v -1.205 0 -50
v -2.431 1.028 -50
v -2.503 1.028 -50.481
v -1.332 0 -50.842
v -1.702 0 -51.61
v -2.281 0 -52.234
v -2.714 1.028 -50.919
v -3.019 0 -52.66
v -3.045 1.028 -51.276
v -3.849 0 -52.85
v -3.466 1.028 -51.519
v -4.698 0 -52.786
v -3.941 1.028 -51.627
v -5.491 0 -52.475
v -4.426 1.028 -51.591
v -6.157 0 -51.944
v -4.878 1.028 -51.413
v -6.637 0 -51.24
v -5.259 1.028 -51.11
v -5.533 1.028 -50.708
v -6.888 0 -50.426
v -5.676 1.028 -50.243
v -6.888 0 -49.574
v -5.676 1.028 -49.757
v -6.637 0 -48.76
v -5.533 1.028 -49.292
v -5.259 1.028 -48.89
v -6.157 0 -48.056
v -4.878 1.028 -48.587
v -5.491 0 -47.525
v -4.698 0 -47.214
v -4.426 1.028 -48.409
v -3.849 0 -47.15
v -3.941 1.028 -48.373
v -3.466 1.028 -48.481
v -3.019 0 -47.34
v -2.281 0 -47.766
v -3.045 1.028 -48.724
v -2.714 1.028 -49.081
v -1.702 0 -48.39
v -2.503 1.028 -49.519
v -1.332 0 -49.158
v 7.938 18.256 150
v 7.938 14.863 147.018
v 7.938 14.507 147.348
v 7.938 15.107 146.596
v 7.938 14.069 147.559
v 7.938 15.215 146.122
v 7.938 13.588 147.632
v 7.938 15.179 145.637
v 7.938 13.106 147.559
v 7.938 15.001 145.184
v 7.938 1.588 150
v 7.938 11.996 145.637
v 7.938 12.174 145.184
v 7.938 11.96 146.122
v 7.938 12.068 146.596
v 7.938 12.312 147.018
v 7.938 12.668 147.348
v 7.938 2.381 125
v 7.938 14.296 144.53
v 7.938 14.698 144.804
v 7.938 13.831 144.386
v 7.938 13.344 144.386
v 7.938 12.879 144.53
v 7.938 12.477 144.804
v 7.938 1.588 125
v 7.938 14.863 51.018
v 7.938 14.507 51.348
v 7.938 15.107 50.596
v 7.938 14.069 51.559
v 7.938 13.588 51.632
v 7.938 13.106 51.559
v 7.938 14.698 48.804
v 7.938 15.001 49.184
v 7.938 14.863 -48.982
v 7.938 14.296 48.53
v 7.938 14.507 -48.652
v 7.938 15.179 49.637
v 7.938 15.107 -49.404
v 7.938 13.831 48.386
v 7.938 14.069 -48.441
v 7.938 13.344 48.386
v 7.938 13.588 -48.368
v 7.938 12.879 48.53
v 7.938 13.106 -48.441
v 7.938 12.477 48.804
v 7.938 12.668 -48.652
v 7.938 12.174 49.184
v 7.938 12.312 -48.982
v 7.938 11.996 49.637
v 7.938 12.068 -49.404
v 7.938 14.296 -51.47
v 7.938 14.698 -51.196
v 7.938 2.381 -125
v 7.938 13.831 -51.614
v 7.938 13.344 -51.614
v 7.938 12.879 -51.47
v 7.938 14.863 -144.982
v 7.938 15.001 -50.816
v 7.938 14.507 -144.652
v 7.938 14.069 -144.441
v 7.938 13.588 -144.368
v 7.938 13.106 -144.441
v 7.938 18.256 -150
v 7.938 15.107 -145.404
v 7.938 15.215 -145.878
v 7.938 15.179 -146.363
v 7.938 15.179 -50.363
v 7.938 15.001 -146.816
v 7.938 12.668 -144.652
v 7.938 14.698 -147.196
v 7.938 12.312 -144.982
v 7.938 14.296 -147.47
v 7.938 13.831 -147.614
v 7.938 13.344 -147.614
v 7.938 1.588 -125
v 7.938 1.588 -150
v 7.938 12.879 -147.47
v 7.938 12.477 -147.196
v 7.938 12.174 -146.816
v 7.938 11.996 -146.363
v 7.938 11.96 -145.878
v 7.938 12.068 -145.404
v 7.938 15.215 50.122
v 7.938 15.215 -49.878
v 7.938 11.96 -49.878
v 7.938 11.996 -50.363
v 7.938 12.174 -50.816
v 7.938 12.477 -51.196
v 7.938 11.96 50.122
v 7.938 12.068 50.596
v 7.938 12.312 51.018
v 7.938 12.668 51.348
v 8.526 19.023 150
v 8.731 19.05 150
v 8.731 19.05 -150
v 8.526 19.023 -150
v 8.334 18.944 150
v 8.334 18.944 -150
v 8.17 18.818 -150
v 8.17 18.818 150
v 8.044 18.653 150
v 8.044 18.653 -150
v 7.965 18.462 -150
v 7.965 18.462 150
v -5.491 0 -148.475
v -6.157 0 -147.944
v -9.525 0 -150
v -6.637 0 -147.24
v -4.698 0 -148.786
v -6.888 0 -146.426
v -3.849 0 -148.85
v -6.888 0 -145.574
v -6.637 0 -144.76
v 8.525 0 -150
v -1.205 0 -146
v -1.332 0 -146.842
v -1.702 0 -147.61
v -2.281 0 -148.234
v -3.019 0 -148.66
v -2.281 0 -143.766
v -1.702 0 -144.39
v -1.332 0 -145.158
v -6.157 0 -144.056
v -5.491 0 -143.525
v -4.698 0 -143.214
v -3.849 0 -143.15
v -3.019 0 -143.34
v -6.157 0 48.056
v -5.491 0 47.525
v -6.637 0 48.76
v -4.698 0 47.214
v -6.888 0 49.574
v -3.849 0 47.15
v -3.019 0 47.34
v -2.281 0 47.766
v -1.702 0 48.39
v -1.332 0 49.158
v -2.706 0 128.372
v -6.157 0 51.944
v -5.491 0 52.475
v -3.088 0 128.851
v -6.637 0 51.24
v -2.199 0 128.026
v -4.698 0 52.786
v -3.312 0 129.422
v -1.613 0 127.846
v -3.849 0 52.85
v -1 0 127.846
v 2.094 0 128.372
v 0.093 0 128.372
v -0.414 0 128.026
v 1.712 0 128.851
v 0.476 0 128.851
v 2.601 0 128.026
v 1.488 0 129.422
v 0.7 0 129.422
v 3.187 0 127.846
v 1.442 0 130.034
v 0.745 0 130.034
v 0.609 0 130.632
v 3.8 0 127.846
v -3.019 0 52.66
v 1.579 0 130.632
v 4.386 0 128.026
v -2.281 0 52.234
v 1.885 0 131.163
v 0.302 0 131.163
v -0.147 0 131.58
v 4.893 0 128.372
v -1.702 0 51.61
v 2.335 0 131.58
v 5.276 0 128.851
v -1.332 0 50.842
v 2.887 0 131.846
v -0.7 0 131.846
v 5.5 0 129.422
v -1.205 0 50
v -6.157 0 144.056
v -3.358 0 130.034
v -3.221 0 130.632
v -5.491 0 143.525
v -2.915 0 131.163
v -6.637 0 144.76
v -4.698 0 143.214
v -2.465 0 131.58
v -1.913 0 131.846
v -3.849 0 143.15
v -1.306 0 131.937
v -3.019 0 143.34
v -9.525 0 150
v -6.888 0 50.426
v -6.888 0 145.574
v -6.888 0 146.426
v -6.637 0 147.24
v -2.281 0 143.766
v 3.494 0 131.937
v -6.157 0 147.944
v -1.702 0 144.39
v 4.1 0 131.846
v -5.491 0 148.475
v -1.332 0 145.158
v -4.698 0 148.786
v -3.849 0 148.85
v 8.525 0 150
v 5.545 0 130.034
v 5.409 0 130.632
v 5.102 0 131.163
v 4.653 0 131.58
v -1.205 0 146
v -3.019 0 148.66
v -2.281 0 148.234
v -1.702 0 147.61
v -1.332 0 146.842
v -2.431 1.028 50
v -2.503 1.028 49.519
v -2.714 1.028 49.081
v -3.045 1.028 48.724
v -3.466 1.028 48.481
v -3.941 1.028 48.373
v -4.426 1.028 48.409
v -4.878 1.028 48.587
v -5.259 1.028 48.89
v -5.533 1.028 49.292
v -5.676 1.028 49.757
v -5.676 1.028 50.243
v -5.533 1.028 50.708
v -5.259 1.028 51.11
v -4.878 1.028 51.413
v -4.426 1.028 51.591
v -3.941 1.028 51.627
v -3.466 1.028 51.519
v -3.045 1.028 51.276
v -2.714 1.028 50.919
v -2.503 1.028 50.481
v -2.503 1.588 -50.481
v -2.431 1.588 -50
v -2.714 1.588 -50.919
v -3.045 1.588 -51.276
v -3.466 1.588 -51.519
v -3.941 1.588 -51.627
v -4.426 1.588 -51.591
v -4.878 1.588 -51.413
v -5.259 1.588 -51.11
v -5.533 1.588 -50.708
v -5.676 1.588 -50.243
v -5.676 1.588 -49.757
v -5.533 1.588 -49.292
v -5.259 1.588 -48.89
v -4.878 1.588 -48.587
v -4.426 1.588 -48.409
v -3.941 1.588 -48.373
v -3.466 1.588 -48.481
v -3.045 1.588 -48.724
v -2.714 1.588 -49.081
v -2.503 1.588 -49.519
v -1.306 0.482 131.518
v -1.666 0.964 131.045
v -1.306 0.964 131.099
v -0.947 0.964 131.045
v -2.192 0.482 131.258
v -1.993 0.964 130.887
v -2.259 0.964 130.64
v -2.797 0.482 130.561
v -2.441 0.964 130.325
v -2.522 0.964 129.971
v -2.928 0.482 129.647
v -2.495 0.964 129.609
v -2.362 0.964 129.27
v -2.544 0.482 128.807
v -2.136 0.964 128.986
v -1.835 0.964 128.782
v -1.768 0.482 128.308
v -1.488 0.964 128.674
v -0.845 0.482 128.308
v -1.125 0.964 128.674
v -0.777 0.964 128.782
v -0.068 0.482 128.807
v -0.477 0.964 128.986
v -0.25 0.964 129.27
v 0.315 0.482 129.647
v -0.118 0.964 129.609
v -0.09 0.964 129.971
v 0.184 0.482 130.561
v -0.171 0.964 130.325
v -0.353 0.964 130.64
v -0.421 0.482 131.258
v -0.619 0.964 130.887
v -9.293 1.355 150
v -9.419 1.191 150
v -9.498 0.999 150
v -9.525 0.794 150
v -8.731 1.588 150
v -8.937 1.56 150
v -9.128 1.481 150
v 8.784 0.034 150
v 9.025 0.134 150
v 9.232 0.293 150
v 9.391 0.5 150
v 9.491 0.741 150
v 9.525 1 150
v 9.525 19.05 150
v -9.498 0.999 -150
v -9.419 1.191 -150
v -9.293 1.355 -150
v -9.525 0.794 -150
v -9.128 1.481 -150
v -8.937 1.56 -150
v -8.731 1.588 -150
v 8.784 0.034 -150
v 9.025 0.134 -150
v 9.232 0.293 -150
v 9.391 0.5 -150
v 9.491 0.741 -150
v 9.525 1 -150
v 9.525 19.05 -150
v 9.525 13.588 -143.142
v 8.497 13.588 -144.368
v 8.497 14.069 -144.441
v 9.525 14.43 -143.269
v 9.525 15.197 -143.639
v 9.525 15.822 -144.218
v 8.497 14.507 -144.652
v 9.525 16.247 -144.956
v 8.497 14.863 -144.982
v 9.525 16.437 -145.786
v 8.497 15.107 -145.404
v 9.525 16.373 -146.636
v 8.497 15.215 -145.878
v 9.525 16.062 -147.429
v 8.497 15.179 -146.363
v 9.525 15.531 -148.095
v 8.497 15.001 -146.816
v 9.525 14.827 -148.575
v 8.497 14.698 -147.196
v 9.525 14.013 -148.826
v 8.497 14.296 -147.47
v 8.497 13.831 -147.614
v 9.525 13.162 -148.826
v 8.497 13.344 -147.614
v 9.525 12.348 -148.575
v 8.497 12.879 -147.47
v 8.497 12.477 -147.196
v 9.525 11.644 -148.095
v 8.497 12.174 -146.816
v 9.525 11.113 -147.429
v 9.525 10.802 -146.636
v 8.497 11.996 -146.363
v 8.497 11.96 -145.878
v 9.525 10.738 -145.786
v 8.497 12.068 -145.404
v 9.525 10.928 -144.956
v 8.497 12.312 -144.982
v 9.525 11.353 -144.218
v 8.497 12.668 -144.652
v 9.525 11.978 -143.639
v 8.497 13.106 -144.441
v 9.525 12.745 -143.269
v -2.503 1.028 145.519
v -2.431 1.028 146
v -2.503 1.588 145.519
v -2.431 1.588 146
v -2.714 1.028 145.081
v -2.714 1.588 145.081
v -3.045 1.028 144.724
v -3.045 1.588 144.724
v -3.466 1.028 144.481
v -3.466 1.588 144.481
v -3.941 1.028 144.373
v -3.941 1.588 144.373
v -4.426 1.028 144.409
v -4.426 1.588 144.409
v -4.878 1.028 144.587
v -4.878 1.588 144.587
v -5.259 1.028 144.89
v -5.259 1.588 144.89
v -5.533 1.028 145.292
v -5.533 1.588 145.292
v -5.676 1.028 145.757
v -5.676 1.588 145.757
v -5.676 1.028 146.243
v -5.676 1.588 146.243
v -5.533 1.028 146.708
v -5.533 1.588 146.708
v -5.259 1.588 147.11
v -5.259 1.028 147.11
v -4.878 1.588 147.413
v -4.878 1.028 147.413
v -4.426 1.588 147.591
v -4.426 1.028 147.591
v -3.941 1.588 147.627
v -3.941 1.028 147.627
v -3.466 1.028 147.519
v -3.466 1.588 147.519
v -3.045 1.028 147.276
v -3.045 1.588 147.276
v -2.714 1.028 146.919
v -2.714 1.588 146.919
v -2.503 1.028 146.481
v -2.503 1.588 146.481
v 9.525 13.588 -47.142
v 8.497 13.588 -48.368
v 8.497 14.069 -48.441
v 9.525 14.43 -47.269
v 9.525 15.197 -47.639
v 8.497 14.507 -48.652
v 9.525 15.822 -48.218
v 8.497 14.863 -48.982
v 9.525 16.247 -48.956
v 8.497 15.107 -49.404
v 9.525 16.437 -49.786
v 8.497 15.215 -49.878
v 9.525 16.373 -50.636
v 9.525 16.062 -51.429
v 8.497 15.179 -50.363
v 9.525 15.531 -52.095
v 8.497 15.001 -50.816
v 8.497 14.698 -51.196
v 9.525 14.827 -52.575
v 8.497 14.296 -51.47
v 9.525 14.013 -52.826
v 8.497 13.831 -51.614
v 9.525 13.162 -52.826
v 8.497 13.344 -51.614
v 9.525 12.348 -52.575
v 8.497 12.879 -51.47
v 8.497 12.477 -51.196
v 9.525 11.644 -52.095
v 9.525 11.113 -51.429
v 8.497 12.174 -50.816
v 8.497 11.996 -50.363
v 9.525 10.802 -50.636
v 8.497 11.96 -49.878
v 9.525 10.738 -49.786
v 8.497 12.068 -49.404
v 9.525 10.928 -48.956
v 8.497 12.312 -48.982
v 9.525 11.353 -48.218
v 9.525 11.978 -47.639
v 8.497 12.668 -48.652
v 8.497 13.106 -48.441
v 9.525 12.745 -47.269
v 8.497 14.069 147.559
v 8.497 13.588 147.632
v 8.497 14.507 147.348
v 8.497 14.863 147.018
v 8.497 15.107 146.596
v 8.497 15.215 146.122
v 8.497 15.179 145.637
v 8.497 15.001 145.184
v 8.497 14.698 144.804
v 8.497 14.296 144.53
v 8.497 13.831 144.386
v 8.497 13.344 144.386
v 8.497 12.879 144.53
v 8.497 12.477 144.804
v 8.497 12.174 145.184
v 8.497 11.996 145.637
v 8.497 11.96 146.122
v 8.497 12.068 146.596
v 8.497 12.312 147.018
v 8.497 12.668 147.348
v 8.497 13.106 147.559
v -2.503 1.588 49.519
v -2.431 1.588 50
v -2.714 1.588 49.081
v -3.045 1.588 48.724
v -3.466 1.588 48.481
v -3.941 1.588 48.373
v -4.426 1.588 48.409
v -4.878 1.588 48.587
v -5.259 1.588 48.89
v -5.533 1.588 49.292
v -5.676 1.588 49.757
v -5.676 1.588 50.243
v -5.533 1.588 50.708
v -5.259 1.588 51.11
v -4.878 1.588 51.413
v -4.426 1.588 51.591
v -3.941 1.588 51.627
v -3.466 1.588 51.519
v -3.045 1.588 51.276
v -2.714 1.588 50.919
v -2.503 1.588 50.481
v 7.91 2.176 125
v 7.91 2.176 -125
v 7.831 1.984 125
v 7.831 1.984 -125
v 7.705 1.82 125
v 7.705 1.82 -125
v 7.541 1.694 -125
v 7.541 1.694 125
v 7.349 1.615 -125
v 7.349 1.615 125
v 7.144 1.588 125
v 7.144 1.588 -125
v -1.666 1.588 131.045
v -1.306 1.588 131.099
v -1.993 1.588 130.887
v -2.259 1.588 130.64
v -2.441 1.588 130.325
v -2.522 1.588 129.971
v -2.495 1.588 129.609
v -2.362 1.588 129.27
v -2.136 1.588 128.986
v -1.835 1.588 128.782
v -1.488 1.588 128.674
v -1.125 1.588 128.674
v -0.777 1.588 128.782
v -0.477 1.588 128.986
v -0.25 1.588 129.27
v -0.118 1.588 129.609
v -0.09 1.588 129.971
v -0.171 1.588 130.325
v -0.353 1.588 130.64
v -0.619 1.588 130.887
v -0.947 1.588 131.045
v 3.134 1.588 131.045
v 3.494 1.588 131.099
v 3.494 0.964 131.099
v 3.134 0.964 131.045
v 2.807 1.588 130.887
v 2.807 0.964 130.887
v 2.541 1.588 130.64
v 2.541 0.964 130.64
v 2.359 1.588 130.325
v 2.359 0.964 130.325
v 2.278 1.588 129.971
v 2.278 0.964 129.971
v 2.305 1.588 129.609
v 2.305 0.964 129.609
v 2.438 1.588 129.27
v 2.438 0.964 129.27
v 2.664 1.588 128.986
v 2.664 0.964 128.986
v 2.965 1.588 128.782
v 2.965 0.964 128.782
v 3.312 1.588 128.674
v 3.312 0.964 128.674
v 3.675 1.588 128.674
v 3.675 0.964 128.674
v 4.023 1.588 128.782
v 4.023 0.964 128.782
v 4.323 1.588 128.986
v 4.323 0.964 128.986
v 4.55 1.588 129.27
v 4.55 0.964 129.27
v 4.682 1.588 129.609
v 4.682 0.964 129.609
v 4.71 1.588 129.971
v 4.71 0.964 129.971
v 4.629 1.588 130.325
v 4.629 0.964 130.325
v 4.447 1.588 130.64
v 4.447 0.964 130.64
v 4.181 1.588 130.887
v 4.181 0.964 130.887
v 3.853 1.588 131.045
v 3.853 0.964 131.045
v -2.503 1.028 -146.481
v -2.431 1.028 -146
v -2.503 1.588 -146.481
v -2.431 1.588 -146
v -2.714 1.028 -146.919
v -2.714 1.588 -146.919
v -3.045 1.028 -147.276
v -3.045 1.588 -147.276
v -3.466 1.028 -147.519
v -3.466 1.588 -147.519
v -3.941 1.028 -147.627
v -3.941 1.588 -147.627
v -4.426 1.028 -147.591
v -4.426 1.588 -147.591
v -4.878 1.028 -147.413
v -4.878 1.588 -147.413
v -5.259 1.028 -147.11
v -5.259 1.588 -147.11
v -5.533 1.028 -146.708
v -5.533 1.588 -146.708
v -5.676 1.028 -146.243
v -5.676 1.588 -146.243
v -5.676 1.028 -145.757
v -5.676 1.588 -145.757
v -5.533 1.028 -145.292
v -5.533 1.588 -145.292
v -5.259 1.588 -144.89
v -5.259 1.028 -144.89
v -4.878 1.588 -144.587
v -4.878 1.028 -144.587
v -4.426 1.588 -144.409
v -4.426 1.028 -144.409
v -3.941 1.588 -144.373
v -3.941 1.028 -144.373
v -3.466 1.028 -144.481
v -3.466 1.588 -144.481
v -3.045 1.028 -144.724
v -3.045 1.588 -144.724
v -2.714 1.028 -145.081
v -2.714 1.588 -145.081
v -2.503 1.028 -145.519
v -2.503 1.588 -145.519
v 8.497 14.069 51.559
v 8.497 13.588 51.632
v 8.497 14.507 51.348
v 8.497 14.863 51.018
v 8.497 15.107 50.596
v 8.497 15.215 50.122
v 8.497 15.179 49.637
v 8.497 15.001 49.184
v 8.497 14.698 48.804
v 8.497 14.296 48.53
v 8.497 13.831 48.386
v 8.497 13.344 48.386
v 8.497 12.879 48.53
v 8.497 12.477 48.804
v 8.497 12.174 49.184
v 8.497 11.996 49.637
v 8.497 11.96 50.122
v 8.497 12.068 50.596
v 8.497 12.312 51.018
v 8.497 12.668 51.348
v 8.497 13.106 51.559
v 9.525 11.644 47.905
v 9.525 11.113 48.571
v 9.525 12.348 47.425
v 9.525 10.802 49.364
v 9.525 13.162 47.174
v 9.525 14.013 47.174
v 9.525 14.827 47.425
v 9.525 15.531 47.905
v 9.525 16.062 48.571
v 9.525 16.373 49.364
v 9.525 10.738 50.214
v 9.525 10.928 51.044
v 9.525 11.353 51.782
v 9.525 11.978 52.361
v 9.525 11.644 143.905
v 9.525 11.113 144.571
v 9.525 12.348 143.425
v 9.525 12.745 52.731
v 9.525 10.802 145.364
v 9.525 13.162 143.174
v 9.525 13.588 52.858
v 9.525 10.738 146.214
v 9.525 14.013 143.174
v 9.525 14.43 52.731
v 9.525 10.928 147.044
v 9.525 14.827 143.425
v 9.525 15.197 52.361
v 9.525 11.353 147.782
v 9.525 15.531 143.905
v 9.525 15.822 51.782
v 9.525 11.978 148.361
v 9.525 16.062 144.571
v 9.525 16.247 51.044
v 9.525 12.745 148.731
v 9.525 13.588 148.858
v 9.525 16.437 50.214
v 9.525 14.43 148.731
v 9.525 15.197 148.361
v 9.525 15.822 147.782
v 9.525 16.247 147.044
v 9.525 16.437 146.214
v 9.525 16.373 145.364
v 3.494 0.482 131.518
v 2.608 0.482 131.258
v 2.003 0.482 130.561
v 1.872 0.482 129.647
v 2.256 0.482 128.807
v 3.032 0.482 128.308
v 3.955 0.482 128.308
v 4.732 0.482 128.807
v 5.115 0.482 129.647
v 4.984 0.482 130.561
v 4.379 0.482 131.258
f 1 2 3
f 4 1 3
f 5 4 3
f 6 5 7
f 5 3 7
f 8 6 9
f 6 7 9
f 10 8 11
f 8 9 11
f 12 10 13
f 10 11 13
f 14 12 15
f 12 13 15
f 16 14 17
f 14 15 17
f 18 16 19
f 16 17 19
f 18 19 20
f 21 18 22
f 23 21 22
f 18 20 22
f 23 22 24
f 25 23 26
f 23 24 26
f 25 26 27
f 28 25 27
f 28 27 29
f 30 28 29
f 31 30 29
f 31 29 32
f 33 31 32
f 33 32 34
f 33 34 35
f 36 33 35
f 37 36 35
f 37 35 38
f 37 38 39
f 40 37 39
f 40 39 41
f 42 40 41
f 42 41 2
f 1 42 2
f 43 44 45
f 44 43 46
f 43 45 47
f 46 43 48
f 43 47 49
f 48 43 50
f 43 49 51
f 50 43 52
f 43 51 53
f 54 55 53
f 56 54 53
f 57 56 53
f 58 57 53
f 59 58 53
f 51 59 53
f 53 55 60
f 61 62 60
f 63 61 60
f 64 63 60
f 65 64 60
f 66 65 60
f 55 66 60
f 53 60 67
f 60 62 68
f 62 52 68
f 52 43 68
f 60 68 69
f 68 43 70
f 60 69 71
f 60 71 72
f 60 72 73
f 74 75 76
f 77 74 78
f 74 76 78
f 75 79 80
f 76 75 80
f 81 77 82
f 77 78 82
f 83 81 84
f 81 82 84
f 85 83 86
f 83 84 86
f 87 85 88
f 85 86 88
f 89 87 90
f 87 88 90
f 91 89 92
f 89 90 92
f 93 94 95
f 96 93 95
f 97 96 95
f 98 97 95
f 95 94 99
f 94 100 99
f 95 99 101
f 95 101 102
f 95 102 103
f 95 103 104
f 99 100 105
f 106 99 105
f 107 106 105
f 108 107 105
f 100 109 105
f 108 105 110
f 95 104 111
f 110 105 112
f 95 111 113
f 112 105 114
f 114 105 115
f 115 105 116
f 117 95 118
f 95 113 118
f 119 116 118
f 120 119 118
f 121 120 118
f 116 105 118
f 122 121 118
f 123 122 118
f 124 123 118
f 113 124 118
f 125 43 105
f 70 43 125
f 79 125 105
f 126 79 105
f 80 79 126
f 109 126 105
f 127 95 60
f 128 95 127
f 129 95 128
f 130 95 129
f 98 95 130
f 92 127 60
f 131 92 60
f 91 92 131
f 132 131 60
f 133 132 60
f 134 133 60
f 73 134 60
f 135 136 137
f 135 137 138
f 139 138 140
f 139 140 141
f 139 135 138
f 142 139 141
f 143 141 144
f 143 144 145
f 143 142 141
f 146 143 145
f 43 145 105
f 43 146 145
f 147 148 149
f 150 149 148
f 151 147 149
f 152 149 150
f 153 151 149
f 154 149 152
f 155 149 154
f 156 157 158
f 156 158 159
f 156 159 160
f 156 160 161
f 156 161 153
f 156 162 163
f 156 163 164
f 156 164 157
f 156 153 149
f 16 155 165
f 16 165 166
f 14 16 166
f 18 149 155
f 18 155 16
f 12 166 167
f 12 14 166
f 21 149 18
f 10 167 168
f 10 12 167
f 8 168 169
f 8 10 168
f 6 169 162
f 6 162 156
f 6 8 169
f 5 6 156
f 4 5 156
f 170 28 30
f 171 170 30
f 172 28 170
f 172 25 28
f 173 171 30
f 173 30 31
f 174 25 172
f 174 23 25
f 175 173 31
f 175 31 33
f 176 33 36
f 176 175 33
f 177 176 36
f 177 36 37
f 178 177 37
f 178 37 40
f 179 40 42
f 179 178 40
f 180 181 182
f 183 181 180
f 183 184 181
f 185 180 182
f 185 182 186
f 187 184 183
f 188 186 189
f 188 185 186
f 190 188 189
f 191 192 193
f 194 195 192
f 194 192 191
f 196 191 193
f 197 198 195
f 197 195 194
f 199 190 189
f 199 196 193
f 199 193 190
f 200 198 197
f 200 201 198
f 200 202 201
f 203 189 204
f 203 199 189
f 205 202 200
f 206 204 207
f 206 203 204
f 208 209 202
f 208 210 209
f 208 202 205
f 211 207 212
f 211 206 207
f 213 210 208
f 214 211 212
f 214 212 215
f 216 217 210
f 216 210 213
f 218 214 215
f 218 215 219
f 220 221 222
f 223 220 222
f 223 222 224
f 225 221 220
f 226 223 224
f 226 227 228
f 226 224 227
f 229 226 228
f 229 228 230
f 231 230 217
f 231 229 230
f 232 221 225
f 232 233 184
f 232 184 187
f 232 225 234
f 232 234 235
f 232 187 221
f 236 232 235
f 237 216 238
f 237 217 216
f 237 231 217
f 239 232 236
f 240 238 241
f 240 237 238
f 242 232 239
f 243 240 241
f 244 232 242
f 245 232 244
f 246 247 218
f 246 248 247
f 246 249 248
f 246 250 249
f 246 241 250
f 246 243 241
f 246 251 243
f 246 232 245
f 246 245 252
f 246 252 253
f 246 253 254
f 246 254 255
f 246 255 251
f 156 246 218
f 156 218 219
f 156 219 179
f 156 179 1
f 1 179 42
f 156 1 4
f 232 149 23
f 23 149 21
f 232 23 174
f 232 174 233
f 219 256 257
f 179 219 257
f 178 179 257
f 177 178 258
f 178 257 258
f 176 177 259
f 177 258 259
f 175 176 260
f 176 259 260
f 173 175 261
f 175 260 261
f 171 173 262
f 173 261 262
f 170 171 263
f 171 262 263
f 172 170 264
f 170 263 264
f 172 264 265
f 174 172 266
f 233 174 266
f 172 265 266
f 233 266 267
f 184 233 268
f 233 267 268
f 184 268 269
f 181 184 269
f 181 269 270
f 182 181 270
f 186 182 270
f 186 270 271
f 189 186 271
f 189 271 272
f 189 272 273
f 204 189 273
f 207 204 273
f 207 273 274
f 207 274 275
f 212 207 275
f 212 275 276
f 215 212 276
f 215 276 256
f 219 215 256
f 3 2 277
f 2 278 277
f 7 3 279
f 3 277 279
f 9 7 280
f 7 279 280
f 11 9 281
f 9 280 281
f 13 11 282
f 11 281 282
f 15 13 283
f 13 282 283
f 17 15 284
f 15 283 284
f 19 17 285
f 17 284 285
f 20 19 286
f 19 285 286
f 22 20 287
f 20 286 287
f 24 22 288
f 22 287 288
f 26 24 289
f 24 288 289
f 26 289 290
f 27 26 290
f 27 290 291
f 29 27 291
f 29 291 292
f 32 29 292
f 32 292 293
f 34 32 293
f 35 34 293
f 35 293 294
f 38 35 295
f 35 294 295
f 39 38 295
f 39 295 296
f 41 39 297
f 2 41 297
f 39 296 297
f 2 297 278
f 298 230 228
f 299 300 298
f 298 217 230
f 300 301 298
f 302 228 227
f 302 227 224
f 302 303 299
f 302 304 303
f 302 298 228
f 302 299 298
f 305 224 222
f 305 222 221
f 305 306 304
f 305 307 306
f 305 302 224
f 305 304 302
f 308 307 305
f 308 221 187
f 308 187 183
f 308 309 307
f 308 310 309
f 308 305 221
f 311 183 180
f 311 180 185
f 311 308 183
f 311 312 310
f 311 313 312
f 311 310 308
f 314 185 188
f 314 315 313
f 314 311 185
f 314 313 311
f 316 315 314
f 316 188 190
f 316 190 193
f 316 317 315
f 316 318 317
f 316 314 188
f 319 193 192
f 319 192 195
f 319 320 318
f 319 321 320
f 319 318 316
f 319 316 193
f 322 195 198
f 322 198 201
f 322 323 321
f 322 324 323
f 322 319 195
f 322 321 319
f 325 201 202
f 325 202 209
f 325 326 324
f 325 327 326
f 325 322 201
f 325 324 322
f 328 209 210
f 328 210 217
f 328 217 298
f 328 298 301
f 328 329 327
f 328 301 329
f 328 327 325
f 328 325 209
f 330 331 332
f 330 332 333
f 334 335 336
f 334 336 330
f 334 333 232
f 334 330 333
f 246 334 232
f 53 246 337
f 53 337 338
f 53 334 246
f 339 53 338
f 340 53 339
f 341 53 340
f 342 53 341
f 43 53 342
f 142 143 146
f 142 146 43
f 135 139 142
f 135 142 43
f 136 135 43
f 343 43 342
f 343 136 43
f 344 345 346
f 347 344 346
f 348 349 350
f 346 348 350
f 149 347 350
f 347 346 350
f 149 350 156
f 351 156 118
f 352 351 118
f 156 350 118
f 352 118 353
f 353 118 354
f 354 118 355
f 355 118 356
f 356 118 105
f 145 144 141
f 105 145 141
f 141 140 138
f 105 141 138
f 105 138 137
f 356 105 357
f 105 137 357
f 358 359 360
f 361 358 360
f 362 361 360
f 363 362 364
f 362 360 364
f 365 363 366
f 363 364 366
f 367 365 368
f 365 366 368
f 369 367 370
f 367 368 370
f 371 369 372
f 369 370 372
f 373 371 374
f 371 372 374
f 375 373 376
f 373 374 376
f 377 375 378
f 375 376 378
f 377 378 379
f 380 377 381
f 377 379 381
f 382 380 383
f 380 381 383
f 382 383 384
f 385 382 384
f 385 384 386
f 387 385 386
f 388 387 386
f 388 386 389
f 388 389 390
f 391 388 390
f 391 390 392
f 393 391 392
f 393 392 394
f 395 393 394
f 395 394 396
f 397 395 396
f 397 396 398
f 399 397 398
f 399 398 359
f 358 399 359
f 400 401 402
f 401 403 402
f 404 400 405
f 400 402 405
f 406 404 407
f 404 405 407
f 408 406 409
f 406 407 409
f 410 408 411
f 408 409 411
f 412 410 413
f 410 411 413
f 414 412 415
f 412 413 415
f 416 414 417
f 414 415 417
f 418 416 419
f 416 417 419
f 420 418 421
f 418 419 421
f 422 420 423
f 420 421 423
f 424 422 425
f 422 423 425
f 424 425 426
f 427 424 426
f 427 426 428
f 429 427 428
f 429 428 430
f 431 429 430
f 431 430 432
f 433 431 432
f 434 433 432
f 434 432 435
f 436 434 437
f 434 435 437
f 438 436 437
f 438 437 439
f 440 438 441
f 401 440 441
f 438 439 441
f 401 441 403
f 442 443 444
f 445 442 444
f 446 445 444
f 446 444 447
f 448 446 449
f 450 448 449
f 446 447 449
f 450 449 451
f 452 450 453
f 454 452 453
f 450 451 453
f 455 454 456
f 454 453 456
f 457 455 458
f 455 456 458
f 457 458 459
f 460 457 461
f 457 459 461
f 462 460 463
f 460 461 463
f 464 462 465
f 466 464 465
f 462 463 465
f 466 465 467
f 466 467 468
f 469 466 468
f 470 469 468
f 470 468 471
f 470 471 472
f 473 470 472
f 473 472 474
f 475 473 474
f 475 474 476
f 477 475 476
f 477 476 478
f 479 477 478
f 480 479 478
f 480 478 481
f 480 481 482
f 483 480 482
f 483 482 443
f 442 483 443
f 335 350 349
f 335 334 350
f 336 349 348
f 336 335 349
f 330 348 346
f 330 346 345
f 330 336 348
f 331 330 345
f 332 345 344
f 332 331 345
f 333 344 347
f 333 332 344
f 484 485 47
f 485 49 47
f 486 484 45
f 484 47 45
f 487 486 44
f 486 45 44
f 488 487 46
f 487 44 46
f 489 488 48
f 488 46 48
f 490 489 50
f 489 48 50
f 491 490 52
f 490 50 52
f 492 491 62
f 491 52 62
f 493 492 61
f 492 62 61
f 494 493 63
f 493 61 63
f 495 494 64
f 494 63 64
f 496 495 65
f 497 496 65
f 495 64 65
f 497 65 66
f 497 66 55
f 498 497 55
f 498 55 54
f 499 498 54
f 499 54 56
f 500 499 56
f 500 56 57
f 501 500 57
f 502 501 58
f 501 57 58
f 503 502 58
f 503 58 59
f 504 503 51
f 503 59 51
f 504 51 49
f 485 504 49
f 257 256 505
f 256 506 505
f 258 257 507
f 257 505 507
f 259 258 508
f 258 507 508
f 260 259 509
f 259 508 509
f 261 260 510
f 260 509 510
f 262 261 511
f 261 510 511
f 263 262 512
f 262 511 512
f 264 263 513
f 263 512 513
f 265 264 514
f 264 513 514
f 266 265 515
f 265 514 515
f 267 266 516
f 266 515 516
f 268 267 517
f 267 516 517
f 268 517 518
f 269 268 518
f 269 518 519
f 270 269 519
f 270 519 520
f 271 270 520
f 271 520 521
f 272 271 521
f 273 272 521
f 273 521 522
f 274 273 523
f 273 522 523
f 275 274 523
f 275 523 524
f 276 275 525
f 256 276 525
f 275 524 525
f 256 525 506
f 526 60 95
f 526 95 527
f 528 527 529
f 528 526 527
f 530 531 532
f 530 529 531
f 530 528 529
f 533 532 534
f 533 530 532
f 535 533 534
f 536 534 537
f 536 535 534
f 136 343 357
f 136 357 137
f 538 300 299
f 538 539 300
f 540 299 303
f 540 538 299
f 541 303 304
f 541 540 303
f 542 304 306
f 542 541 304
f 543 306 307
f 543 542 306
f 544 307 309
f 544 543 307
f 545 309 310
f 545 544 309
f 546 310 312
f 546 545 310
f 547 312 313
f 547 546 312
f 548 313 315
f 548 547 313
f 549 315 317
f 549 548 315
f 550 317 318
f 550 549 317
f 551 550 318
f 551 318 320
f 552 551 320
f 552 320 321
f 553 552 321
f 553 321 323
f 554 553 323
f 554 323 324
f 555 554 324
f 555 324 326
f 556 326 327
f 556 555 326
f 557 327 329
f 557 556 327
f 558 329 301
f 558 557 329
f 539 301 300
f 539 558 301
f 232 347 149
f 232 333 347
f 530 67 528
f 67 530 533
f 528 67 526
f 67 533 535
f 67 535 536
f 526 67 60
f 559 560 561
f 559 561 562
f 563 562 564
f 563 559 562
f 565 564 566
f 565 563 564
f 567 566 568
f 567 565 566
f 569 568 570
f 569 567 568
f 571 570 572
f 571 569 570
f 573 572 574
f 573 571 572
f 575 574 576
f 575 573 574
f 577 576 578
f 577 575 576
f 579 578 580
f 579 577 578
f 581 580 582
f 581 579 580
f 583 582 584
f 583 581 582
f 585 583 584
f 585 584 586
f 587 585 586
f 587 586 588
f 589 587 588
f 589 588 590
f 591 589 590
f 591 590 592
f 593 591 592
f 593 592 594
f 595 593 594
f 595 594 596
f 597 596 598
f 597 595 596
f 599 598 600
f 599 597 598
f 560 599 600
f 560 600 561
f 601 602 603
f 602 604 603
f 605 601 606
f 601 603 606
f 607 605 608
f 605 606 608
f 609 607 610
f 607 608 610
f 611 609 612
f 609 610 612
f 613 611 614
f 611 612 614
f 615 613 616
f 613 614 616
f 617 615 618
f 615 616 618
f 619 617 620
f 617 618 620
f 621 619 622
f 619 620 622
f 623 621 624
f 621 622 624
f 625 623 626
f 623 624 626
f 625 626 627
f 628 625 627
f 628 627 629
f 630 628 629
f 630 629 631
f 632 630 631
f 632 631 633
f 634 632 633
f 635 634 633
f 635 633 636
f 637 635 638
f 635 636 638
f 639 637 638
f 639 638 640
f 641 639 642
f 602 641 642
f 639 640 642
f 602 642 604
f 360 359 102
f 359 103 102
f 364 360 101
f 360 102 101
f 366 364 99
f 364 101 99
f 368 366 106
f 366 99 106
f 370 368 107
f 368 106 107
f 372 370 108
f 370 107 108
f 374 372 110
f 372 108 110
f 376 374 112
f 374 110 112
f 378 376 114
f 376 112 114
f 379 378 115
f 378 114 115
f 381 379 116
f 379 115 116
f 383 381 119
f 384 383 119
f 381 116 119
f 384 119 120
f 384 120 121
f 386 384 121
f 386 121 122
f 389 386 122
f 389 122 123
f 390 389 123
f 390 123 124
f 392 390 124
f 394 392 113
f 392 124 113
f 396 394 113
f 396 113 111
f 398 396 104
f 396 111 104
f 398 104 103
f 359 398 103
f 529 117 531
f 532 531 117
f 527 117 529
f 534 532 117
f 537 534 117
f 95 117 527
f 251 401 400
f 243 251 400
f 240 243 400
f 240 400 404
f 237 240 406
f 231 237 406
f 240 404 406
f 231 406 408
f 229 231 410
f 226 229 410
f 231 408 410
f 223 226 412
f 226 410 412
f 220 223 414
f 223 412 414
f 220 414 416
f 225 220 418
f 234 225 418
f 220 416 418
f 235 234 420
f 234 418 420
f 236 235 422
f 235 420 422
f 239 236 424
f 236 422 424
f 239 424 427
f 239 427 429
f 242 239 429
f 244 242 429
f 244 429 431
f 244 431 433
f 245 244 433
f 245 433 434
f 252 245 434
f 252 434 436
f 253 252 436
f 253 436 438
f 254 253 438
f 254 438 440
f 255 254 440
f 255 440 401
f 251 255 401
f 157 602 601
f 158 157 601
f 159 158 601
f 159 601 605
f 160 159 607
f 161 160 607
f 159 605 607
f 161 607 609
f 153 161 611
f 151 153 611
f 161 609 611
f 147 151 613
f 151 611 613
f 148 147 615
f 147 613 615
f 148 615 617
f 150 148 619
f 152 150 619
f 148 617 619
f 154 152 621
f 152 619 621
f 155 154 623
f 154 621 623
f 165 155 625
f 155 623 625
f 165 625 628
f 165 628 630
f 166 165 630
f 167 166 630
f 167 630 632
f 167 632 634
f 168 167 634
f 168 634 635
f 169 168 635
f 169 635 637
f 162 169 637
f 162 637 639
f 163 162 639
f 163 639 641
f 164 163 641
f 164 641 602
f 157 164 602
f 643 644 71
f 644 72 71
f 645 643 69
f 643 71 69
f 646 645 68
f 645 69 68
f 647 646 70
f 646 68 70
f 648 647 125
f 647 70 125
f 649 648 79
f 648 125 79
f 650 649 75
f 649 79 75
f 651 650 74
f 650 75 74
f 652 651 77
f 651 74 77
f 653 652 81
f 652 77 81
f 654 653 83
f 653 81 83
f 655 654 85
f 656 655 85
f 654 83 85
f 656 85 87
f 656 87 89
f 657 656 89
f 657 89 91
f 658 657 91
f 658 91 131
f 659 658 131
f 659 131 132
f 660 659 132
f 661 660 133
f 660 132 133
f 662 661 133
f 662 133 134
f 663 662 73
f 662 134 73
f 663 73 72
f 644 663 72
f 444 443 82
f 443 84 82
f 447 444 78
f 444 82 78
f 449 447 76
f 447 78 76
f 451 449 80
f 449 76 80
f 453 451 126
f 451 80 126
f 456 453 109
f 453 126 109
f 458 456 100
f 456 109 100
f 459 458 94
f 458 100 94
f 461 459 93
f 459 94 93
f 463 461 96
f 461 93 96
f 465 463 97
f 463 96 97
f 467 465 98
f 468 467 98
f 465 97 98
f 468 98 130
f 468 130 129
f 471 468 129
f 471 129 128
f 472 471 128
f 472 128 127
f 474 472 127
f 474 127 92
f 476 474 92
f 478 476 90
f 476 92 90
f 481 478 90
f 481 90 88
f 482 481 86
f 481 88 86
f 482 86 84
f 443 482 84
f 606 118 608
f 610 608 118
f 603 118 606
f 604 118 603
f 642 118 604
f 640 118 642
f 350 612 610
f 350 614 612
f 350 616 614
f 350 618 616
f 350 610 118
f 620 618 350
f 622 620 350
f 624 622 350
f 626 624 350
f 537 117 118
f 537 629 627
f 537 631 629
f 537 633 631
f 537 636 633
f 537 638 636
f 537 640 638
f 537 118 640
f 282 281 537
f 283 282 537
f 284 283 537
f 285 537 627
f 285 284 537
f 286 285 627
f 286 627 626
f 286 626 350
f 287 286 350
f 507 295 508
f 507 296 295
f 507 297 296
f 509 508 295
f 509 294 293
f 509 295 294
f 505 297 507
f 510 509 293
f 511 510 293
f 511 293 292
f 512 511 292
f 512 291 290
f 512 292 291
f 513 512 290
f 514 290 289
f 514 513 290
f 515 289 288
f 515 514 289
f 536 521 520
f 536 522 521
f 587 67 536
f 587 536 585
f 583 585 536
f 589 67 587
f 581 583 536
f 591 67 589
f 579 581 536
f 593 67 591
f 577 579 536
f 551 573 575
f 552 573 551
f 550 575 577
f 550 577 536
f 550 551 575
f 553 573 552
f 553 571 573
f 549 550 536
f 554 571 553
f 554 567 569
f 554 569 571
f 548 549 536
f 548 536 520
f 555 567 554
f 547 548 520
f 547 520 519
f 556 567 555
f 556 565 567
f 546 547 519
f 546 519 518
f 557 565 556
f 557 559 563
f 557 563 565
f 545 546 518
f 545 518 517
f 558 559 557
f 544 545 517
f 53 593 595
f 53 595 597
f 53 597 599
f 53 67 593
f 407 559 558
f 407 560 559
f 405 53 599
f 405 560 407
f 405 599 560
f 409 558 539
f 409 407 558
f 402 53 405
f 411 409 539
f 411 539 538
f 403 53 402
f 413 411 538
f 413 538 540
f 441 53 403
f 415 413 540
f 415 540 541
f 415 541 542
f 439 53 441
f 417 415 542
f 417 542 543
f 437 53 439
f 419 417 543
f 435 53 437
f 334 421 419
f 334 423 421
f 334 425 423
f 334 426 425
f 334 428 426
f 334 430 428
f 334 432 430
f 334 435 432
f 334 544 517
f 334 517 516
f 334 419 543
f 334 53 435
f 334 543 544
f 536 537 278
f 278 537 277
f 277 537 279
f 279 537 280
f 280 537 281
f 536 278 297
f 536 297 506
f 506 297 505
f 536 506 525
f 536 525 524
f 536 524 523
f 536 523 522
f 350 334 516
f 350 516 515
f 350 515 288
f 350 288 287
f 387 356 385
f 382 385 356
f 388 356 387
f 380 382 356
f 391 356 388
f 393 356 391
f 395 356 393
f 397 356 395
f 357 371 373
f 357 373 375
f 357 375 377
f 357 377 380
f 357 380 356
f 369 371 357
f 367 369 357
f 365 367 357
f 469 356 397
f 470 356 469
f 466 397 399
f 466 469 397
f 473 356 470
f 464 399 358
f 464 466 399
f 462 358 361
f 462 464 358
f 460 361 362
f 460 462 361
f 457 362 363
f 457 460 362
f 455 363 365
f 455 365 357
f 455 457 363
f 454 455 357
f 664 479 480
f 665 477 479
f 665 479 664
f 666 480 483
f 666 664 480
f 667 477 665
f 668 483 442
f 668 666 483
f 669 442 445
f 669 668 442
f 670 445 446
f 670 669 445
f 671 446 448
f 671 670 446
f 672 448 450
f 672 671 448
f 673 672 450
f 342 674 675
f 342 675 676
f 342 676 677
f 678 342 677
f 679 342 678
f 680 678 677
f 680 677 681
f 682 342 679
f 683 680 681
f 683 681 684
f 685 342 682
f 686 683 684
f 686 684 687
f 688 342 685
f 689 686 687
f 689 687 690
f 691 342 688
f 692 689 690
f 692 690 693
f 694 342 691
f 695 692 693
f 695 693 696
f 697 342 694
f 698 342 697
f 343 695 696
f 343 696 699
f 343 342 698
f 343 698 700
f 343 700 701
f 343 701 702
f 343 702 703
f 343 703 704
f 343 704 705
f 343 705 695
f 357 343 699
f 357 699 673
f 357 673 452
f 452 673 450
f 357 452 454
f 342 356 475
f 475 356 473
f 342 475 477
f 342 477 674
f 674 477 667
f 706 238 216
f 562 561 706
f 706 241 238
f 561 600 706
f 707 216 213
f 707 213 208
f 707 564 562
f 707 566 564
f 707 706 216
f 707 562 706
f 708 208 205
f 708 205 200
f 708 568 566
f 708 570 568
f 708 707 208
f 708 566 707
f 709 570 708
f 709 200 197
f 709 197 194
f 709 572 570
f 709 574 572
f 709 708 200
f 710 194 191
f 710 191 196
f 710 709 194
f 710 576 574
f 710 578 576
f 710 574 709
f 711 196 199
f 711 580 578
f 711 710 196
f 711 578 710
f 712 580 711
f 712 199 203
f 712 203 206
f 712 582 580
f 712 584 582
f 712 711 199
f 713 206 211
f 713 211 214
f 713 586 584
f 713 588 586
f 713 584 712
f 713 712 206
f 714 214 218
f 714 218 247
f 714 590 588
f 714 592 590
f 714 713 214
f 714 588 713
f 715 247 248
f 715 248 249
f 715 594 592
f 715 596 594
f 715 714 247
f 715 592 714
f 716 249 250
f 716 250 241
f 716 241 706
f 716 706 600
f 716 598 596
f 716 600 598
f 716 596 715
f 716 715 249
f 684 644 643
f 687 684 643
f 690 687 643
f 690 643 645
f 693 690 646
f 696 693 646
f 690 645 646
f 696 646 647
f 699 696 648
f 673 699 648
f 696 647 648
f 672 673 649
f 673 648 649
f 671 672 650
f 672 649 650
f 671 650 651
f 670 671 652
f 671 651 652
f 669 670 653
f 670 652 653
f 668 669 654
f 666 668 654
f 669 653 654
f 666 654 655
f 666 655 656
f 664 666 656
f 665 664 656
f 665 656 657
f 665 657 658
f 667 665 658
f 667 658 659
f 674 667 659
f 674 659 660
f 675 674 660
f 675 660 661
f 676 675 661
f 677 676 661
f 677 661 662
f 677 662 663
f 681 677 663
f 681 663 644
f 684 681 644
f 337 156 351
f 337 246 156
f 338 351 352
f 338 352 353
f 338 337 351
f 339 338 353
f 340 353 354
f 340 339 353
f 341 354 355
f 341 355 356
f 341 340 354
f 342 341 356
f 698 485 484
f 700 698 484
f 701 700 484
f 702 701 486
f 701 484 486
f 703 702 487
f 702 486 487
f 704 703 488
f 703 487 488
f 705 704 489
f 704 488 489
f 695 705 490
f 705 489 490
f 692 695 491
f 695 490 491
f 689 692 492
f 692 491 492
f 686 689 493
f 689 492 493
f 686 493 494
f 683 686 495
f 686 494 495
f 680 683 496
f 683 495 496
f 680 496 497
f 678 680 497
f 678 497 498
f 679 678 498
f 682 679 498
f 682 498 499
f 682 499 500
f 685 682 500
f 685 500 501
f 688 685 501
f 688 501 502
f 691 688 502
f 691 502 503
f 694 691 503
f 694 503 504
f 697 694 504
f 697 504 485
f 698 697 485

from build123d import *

# Parameters (mm, degrees)
BOSS_EXTRUDE1_DEPTH                               = 150
CSK_FOR_4_FLAT_HEAD_MACHINE_SCREW_100_D           = 3.2639
CSK_FOR_4_FLAT_HEAD_MACHINE_SCREW_100_CSINK_D     = 5.715
CSK_FOR_4_FLAT_HEAD_MACHINE_SCREW_100_CSINK_ANGLE = 100
CSK_FOR_4_FLAT_HEAD_MACHINE_SCREW_2_D             = 3.2639
CSK_FOR_4_FLAT_HEAD_MACHINE_SCREW_2_CSINK_D       = 5.715
CSK_FOR_4_FLAT_HEAD_MACHINE_SCREW_2_CSINK_ANGLE   = 100
FILLET1_R                                         = 1
F_2_CLEARANCE_HOLE1_AT_2_COUNT                    = 2
F_2_CLEARANCE_HOLE1_AT_2_PITCH                    = 4.8
CSK_FOR_4_FLAT_HEAD_MACHINE_SCREW_3_D             = 3.2639
CSK_FOR_4_FLAT_HEAD_MACHINE_SCREW_3_CSINK_D       = 5.715
CSK_FOR_4_FLAT_HEAD_MACHINE_SCREW_3_CSINK_ANGLE   = 100
CSK_FOR_4_FLAT_HEAD_MACHINE_SCREW_4_D             = 3.2639
CSK_FOR_4_FLAT_HEAD_MACHINE_SCREW_4_CSINK_D       = 5.715
CSK_FOR_4_FLAT_HEAD_MACHINE_SCREW_4_CSINK_ANGLE   = 100
CSK_FOR_4_FLAT_HEAD_MACHINE_SCREW_5_D             = 3.2639
CSK_FOR_4_FLAT_HEAD_MACHINE_SCREW_5_CSINK_D       = 5.715
CSK_FOR_4_FLAT_HEAD_MACHINE_SCREW_5_CSINK_ANGLE   = 100
CSK_FOR_4_FLAT_HEAD_MACHINE_SCREW_6_D             = 3.2639
CSK_FOR_4_FLAT_HEAD_MACHINE_SCREW_6_CSINK_D       = 5.715
CSK_FOR_4_FLAT_HEAD_MACHINE_SCREW_6_CSINK_ANGLE   = 100
CUT_EXTRUDE1_DEPTH                                = 25


with BuildPart() as part:
    # Sketch2 → Boss-Extrude1 (new, symmetric)
    with BuildSketch(Plane.XY):
        with BuildLine():
            Line((-9.525, 0), (9.525, 0))
            Line((9.525, 0), (9.525, 19.05))
            Line((9.525, 19.05), (8.73125, 19.05))
            ThreePointArc((8.73125, 19.05), (8.169983992, 18.817516008), (7.9375, 18.25625))
            Line((7.9375, 18.25625), (7.9375, 2.38125))
            ThreePointArc((7.9375, 2.38125), (7.705016008, 1.819983992), (7.14375, 1.5875))
            Line((7.14375, 1.5875), (-8.73125, 1.5875))
            ThreePointArc((-8.73125, 1.5875), (-9.292516008, 1.355016008), (-9.525, 0.79375))
            Line((-9.525, 0.79375), (-9.525, 0))
        make_face()
    extrude(amount=BOSS_EXTRUDE1_DEPTH, both=True)

    # CSK for _4 Flat Head Machine Screw _100 (through all)
    with Locations(Plane(origin=(0, 0, 0), x_dir=(-1, 0, 0), z_dir=(0, -1, 0))):
        with Locations((4.0625, -146), (4.0625, 146)):
            CounterSinkHole(CSK_FOR_4_FLAT_HEAD_MACHINE_SCREW_100_D / 2, CSK_FOR_4_FLAT_HEAD_MACHINE_SCREW_100_CSINK_D / 2, counter_sink_angle=CSK_FOR_4_FLAT_HEAD_MACHINE_SCREW_100_CSINK_ANGLE)

    # CSK for _4 Flat Head Machine Screw _ 2 (through all)
    with Locations(Plane(origin=(9.525, 0, 0), x_dir=(0, 0, -1), z_dir=(1, 0, 0))):
        with Locations((-146, 13.5875), (146, 13.5875)):
            CounterSinkHole(CSK_FOR_4_FLAT_HEAD_MACHINE_SCREW_2_D / 2, CSK_FOR_4_FLAT_HEAD_MACHINE_SCREW_2_CSINK_D / 2, counter_sink_angle=CSK_FOR_4_FLAT_HEAD_MACHINE_SCREW_2_CSINK_ANGLE)

    # Fillet1
    fillet1_edges = [part.edges().sort_by_distance(p)[0] for p in [
        (9.525, 0, 0),
    ]]
    fillet(fillet1_edges, radius=FILLET1_R)

    # Sketch30 → #2 Clearance Hole1 (revolve, cut)
    with BuildSketch(Plane(origin=(3.49375, 1.5875, 129.88), x_dir=(0, 0, 1), z_dir=(1, 0, 0))):
        Polygon((0, 0), (0, 1.5875), (2.0574, 1.5875), (1.2192, 0.623261201), (1.2192, 0), align=None)
    f_2_clearance_hole1 = revolve(axis=Axis((3.49375, 7.9375, 129.88), (0, -1, 0)), mode=Mode.SUBTRACT)

    # #2 Clearance Hole1 at 2: #2 Clearance Hole1 ×2
    with Locations(*[(-i * F_2_CLEARANCE_HOLE1_AT_2_PITCH, 0, 0) for i in range(1, F_2_CLEARANCE_HOLE1_AT_2_COUNT)]):
        add(f_2_clearance_hole1, mode=Mode.SUBTRACT)

    # CSK for _4 Flat Head Machine Screw _ 3 (through all)
    with Locations(Plane(origin=(0, 0, 0), x_dir=(-1, 0, 0), z_dir=(0, -1, 0))):
        with Locations((4.0625, 50)):
            CounterSinkHole(CSK_FOR_4_FLAT_HEAD_MACHINE_SCREW_3_D / 2, CSK_FOR_4_FLAT_HEAD_MACHINE_SCREW_3_CSINK_D / 2, counter_sink_angle=CSK_FOR_4_FLAT_HEAD_MACHINE_SCREW_3_CSINK_ANGLE)

    # CSK for _4 Flat Head Machine Screw _ 4 (through all)
    with Locations(Plane(origin=(9.525, 0, 0), x_dir=(0, 0, -1), z_dir=(1, 0, 0))):
        with Locations((50, 13.5875)):
            CounterSinkHole(CSK_FOR_4_FLAT_HEAD_MACHINE_SCREW_4_D / 2, CSK_FOR_4_FLAT_HEAD_MACHINE_SCREW_4_CSINK_D / 2, counter_sink_angle=CSK_FOR_4_FLAT_HEAD_MACHINE_SCREW_4_CSINK_ANGLE)

    # CSK for _4 Flat Head Machine Screw _ 5 (through all)
    with Locations(Plane(origin=(9.525, 0, 0), x_dir=(0, 0, -1), z_dir=(1, 0, 0))):
        with Locations((-50, 13.5875)):
            CounterSinkHole(CSK_FOR_4_FLAT_HEAD_MACHINE_SCREW_5_D / 2, CSK_FOR_4_FLAT_HEAD_MACHINE_SCREW_5_CSINK_D / 2, counter_sink_angle=CSK_FOR_4_FLAT_HEAD_MACHINE_SCREW_5_CSINK_ANGLE)

    # CSK for _4 Flat Head Machine Screw _ 6 (through all)
    with Locations(Plane(origin=(0, 0, 0), x_dir=(-1, 0, 0), z_dir=(0, -1, 0))):
        with Locations((4.0625, -50)):
            CounterSinkHole(CSK_FOR_4_FLAT_HEAD_MACHINE_SCREW_6_D / 2, CSK_FOR_4_FLAT_HEAD_MACHINE_SCREW_6_CSINK_D / 2, counter_sink_angle=CSK_FOR_4_FLAT_HEAD_MACHINE_SCREW_6_CSINK_ANGLE)

    # Sketch44 → Cut-Extrude1 (cut)
    with BuildSketch(Plane.XY.offset(150)):
        Polygon((7.9375, 6.5875), (7.9375, 1.5875), (2.9375, 1.5875), align=None)
    cut_extrude1 = extrude(amount=-CUT_EXTRUDE1_DEPTH, mode=Mode.SUBTRACT)

    # Mirror1: Cut-Extrude1 across plane
    add(cut_extrude1.mirror(Plane.XY), mode=Mode.SUBTRACT)


solid = part.part
